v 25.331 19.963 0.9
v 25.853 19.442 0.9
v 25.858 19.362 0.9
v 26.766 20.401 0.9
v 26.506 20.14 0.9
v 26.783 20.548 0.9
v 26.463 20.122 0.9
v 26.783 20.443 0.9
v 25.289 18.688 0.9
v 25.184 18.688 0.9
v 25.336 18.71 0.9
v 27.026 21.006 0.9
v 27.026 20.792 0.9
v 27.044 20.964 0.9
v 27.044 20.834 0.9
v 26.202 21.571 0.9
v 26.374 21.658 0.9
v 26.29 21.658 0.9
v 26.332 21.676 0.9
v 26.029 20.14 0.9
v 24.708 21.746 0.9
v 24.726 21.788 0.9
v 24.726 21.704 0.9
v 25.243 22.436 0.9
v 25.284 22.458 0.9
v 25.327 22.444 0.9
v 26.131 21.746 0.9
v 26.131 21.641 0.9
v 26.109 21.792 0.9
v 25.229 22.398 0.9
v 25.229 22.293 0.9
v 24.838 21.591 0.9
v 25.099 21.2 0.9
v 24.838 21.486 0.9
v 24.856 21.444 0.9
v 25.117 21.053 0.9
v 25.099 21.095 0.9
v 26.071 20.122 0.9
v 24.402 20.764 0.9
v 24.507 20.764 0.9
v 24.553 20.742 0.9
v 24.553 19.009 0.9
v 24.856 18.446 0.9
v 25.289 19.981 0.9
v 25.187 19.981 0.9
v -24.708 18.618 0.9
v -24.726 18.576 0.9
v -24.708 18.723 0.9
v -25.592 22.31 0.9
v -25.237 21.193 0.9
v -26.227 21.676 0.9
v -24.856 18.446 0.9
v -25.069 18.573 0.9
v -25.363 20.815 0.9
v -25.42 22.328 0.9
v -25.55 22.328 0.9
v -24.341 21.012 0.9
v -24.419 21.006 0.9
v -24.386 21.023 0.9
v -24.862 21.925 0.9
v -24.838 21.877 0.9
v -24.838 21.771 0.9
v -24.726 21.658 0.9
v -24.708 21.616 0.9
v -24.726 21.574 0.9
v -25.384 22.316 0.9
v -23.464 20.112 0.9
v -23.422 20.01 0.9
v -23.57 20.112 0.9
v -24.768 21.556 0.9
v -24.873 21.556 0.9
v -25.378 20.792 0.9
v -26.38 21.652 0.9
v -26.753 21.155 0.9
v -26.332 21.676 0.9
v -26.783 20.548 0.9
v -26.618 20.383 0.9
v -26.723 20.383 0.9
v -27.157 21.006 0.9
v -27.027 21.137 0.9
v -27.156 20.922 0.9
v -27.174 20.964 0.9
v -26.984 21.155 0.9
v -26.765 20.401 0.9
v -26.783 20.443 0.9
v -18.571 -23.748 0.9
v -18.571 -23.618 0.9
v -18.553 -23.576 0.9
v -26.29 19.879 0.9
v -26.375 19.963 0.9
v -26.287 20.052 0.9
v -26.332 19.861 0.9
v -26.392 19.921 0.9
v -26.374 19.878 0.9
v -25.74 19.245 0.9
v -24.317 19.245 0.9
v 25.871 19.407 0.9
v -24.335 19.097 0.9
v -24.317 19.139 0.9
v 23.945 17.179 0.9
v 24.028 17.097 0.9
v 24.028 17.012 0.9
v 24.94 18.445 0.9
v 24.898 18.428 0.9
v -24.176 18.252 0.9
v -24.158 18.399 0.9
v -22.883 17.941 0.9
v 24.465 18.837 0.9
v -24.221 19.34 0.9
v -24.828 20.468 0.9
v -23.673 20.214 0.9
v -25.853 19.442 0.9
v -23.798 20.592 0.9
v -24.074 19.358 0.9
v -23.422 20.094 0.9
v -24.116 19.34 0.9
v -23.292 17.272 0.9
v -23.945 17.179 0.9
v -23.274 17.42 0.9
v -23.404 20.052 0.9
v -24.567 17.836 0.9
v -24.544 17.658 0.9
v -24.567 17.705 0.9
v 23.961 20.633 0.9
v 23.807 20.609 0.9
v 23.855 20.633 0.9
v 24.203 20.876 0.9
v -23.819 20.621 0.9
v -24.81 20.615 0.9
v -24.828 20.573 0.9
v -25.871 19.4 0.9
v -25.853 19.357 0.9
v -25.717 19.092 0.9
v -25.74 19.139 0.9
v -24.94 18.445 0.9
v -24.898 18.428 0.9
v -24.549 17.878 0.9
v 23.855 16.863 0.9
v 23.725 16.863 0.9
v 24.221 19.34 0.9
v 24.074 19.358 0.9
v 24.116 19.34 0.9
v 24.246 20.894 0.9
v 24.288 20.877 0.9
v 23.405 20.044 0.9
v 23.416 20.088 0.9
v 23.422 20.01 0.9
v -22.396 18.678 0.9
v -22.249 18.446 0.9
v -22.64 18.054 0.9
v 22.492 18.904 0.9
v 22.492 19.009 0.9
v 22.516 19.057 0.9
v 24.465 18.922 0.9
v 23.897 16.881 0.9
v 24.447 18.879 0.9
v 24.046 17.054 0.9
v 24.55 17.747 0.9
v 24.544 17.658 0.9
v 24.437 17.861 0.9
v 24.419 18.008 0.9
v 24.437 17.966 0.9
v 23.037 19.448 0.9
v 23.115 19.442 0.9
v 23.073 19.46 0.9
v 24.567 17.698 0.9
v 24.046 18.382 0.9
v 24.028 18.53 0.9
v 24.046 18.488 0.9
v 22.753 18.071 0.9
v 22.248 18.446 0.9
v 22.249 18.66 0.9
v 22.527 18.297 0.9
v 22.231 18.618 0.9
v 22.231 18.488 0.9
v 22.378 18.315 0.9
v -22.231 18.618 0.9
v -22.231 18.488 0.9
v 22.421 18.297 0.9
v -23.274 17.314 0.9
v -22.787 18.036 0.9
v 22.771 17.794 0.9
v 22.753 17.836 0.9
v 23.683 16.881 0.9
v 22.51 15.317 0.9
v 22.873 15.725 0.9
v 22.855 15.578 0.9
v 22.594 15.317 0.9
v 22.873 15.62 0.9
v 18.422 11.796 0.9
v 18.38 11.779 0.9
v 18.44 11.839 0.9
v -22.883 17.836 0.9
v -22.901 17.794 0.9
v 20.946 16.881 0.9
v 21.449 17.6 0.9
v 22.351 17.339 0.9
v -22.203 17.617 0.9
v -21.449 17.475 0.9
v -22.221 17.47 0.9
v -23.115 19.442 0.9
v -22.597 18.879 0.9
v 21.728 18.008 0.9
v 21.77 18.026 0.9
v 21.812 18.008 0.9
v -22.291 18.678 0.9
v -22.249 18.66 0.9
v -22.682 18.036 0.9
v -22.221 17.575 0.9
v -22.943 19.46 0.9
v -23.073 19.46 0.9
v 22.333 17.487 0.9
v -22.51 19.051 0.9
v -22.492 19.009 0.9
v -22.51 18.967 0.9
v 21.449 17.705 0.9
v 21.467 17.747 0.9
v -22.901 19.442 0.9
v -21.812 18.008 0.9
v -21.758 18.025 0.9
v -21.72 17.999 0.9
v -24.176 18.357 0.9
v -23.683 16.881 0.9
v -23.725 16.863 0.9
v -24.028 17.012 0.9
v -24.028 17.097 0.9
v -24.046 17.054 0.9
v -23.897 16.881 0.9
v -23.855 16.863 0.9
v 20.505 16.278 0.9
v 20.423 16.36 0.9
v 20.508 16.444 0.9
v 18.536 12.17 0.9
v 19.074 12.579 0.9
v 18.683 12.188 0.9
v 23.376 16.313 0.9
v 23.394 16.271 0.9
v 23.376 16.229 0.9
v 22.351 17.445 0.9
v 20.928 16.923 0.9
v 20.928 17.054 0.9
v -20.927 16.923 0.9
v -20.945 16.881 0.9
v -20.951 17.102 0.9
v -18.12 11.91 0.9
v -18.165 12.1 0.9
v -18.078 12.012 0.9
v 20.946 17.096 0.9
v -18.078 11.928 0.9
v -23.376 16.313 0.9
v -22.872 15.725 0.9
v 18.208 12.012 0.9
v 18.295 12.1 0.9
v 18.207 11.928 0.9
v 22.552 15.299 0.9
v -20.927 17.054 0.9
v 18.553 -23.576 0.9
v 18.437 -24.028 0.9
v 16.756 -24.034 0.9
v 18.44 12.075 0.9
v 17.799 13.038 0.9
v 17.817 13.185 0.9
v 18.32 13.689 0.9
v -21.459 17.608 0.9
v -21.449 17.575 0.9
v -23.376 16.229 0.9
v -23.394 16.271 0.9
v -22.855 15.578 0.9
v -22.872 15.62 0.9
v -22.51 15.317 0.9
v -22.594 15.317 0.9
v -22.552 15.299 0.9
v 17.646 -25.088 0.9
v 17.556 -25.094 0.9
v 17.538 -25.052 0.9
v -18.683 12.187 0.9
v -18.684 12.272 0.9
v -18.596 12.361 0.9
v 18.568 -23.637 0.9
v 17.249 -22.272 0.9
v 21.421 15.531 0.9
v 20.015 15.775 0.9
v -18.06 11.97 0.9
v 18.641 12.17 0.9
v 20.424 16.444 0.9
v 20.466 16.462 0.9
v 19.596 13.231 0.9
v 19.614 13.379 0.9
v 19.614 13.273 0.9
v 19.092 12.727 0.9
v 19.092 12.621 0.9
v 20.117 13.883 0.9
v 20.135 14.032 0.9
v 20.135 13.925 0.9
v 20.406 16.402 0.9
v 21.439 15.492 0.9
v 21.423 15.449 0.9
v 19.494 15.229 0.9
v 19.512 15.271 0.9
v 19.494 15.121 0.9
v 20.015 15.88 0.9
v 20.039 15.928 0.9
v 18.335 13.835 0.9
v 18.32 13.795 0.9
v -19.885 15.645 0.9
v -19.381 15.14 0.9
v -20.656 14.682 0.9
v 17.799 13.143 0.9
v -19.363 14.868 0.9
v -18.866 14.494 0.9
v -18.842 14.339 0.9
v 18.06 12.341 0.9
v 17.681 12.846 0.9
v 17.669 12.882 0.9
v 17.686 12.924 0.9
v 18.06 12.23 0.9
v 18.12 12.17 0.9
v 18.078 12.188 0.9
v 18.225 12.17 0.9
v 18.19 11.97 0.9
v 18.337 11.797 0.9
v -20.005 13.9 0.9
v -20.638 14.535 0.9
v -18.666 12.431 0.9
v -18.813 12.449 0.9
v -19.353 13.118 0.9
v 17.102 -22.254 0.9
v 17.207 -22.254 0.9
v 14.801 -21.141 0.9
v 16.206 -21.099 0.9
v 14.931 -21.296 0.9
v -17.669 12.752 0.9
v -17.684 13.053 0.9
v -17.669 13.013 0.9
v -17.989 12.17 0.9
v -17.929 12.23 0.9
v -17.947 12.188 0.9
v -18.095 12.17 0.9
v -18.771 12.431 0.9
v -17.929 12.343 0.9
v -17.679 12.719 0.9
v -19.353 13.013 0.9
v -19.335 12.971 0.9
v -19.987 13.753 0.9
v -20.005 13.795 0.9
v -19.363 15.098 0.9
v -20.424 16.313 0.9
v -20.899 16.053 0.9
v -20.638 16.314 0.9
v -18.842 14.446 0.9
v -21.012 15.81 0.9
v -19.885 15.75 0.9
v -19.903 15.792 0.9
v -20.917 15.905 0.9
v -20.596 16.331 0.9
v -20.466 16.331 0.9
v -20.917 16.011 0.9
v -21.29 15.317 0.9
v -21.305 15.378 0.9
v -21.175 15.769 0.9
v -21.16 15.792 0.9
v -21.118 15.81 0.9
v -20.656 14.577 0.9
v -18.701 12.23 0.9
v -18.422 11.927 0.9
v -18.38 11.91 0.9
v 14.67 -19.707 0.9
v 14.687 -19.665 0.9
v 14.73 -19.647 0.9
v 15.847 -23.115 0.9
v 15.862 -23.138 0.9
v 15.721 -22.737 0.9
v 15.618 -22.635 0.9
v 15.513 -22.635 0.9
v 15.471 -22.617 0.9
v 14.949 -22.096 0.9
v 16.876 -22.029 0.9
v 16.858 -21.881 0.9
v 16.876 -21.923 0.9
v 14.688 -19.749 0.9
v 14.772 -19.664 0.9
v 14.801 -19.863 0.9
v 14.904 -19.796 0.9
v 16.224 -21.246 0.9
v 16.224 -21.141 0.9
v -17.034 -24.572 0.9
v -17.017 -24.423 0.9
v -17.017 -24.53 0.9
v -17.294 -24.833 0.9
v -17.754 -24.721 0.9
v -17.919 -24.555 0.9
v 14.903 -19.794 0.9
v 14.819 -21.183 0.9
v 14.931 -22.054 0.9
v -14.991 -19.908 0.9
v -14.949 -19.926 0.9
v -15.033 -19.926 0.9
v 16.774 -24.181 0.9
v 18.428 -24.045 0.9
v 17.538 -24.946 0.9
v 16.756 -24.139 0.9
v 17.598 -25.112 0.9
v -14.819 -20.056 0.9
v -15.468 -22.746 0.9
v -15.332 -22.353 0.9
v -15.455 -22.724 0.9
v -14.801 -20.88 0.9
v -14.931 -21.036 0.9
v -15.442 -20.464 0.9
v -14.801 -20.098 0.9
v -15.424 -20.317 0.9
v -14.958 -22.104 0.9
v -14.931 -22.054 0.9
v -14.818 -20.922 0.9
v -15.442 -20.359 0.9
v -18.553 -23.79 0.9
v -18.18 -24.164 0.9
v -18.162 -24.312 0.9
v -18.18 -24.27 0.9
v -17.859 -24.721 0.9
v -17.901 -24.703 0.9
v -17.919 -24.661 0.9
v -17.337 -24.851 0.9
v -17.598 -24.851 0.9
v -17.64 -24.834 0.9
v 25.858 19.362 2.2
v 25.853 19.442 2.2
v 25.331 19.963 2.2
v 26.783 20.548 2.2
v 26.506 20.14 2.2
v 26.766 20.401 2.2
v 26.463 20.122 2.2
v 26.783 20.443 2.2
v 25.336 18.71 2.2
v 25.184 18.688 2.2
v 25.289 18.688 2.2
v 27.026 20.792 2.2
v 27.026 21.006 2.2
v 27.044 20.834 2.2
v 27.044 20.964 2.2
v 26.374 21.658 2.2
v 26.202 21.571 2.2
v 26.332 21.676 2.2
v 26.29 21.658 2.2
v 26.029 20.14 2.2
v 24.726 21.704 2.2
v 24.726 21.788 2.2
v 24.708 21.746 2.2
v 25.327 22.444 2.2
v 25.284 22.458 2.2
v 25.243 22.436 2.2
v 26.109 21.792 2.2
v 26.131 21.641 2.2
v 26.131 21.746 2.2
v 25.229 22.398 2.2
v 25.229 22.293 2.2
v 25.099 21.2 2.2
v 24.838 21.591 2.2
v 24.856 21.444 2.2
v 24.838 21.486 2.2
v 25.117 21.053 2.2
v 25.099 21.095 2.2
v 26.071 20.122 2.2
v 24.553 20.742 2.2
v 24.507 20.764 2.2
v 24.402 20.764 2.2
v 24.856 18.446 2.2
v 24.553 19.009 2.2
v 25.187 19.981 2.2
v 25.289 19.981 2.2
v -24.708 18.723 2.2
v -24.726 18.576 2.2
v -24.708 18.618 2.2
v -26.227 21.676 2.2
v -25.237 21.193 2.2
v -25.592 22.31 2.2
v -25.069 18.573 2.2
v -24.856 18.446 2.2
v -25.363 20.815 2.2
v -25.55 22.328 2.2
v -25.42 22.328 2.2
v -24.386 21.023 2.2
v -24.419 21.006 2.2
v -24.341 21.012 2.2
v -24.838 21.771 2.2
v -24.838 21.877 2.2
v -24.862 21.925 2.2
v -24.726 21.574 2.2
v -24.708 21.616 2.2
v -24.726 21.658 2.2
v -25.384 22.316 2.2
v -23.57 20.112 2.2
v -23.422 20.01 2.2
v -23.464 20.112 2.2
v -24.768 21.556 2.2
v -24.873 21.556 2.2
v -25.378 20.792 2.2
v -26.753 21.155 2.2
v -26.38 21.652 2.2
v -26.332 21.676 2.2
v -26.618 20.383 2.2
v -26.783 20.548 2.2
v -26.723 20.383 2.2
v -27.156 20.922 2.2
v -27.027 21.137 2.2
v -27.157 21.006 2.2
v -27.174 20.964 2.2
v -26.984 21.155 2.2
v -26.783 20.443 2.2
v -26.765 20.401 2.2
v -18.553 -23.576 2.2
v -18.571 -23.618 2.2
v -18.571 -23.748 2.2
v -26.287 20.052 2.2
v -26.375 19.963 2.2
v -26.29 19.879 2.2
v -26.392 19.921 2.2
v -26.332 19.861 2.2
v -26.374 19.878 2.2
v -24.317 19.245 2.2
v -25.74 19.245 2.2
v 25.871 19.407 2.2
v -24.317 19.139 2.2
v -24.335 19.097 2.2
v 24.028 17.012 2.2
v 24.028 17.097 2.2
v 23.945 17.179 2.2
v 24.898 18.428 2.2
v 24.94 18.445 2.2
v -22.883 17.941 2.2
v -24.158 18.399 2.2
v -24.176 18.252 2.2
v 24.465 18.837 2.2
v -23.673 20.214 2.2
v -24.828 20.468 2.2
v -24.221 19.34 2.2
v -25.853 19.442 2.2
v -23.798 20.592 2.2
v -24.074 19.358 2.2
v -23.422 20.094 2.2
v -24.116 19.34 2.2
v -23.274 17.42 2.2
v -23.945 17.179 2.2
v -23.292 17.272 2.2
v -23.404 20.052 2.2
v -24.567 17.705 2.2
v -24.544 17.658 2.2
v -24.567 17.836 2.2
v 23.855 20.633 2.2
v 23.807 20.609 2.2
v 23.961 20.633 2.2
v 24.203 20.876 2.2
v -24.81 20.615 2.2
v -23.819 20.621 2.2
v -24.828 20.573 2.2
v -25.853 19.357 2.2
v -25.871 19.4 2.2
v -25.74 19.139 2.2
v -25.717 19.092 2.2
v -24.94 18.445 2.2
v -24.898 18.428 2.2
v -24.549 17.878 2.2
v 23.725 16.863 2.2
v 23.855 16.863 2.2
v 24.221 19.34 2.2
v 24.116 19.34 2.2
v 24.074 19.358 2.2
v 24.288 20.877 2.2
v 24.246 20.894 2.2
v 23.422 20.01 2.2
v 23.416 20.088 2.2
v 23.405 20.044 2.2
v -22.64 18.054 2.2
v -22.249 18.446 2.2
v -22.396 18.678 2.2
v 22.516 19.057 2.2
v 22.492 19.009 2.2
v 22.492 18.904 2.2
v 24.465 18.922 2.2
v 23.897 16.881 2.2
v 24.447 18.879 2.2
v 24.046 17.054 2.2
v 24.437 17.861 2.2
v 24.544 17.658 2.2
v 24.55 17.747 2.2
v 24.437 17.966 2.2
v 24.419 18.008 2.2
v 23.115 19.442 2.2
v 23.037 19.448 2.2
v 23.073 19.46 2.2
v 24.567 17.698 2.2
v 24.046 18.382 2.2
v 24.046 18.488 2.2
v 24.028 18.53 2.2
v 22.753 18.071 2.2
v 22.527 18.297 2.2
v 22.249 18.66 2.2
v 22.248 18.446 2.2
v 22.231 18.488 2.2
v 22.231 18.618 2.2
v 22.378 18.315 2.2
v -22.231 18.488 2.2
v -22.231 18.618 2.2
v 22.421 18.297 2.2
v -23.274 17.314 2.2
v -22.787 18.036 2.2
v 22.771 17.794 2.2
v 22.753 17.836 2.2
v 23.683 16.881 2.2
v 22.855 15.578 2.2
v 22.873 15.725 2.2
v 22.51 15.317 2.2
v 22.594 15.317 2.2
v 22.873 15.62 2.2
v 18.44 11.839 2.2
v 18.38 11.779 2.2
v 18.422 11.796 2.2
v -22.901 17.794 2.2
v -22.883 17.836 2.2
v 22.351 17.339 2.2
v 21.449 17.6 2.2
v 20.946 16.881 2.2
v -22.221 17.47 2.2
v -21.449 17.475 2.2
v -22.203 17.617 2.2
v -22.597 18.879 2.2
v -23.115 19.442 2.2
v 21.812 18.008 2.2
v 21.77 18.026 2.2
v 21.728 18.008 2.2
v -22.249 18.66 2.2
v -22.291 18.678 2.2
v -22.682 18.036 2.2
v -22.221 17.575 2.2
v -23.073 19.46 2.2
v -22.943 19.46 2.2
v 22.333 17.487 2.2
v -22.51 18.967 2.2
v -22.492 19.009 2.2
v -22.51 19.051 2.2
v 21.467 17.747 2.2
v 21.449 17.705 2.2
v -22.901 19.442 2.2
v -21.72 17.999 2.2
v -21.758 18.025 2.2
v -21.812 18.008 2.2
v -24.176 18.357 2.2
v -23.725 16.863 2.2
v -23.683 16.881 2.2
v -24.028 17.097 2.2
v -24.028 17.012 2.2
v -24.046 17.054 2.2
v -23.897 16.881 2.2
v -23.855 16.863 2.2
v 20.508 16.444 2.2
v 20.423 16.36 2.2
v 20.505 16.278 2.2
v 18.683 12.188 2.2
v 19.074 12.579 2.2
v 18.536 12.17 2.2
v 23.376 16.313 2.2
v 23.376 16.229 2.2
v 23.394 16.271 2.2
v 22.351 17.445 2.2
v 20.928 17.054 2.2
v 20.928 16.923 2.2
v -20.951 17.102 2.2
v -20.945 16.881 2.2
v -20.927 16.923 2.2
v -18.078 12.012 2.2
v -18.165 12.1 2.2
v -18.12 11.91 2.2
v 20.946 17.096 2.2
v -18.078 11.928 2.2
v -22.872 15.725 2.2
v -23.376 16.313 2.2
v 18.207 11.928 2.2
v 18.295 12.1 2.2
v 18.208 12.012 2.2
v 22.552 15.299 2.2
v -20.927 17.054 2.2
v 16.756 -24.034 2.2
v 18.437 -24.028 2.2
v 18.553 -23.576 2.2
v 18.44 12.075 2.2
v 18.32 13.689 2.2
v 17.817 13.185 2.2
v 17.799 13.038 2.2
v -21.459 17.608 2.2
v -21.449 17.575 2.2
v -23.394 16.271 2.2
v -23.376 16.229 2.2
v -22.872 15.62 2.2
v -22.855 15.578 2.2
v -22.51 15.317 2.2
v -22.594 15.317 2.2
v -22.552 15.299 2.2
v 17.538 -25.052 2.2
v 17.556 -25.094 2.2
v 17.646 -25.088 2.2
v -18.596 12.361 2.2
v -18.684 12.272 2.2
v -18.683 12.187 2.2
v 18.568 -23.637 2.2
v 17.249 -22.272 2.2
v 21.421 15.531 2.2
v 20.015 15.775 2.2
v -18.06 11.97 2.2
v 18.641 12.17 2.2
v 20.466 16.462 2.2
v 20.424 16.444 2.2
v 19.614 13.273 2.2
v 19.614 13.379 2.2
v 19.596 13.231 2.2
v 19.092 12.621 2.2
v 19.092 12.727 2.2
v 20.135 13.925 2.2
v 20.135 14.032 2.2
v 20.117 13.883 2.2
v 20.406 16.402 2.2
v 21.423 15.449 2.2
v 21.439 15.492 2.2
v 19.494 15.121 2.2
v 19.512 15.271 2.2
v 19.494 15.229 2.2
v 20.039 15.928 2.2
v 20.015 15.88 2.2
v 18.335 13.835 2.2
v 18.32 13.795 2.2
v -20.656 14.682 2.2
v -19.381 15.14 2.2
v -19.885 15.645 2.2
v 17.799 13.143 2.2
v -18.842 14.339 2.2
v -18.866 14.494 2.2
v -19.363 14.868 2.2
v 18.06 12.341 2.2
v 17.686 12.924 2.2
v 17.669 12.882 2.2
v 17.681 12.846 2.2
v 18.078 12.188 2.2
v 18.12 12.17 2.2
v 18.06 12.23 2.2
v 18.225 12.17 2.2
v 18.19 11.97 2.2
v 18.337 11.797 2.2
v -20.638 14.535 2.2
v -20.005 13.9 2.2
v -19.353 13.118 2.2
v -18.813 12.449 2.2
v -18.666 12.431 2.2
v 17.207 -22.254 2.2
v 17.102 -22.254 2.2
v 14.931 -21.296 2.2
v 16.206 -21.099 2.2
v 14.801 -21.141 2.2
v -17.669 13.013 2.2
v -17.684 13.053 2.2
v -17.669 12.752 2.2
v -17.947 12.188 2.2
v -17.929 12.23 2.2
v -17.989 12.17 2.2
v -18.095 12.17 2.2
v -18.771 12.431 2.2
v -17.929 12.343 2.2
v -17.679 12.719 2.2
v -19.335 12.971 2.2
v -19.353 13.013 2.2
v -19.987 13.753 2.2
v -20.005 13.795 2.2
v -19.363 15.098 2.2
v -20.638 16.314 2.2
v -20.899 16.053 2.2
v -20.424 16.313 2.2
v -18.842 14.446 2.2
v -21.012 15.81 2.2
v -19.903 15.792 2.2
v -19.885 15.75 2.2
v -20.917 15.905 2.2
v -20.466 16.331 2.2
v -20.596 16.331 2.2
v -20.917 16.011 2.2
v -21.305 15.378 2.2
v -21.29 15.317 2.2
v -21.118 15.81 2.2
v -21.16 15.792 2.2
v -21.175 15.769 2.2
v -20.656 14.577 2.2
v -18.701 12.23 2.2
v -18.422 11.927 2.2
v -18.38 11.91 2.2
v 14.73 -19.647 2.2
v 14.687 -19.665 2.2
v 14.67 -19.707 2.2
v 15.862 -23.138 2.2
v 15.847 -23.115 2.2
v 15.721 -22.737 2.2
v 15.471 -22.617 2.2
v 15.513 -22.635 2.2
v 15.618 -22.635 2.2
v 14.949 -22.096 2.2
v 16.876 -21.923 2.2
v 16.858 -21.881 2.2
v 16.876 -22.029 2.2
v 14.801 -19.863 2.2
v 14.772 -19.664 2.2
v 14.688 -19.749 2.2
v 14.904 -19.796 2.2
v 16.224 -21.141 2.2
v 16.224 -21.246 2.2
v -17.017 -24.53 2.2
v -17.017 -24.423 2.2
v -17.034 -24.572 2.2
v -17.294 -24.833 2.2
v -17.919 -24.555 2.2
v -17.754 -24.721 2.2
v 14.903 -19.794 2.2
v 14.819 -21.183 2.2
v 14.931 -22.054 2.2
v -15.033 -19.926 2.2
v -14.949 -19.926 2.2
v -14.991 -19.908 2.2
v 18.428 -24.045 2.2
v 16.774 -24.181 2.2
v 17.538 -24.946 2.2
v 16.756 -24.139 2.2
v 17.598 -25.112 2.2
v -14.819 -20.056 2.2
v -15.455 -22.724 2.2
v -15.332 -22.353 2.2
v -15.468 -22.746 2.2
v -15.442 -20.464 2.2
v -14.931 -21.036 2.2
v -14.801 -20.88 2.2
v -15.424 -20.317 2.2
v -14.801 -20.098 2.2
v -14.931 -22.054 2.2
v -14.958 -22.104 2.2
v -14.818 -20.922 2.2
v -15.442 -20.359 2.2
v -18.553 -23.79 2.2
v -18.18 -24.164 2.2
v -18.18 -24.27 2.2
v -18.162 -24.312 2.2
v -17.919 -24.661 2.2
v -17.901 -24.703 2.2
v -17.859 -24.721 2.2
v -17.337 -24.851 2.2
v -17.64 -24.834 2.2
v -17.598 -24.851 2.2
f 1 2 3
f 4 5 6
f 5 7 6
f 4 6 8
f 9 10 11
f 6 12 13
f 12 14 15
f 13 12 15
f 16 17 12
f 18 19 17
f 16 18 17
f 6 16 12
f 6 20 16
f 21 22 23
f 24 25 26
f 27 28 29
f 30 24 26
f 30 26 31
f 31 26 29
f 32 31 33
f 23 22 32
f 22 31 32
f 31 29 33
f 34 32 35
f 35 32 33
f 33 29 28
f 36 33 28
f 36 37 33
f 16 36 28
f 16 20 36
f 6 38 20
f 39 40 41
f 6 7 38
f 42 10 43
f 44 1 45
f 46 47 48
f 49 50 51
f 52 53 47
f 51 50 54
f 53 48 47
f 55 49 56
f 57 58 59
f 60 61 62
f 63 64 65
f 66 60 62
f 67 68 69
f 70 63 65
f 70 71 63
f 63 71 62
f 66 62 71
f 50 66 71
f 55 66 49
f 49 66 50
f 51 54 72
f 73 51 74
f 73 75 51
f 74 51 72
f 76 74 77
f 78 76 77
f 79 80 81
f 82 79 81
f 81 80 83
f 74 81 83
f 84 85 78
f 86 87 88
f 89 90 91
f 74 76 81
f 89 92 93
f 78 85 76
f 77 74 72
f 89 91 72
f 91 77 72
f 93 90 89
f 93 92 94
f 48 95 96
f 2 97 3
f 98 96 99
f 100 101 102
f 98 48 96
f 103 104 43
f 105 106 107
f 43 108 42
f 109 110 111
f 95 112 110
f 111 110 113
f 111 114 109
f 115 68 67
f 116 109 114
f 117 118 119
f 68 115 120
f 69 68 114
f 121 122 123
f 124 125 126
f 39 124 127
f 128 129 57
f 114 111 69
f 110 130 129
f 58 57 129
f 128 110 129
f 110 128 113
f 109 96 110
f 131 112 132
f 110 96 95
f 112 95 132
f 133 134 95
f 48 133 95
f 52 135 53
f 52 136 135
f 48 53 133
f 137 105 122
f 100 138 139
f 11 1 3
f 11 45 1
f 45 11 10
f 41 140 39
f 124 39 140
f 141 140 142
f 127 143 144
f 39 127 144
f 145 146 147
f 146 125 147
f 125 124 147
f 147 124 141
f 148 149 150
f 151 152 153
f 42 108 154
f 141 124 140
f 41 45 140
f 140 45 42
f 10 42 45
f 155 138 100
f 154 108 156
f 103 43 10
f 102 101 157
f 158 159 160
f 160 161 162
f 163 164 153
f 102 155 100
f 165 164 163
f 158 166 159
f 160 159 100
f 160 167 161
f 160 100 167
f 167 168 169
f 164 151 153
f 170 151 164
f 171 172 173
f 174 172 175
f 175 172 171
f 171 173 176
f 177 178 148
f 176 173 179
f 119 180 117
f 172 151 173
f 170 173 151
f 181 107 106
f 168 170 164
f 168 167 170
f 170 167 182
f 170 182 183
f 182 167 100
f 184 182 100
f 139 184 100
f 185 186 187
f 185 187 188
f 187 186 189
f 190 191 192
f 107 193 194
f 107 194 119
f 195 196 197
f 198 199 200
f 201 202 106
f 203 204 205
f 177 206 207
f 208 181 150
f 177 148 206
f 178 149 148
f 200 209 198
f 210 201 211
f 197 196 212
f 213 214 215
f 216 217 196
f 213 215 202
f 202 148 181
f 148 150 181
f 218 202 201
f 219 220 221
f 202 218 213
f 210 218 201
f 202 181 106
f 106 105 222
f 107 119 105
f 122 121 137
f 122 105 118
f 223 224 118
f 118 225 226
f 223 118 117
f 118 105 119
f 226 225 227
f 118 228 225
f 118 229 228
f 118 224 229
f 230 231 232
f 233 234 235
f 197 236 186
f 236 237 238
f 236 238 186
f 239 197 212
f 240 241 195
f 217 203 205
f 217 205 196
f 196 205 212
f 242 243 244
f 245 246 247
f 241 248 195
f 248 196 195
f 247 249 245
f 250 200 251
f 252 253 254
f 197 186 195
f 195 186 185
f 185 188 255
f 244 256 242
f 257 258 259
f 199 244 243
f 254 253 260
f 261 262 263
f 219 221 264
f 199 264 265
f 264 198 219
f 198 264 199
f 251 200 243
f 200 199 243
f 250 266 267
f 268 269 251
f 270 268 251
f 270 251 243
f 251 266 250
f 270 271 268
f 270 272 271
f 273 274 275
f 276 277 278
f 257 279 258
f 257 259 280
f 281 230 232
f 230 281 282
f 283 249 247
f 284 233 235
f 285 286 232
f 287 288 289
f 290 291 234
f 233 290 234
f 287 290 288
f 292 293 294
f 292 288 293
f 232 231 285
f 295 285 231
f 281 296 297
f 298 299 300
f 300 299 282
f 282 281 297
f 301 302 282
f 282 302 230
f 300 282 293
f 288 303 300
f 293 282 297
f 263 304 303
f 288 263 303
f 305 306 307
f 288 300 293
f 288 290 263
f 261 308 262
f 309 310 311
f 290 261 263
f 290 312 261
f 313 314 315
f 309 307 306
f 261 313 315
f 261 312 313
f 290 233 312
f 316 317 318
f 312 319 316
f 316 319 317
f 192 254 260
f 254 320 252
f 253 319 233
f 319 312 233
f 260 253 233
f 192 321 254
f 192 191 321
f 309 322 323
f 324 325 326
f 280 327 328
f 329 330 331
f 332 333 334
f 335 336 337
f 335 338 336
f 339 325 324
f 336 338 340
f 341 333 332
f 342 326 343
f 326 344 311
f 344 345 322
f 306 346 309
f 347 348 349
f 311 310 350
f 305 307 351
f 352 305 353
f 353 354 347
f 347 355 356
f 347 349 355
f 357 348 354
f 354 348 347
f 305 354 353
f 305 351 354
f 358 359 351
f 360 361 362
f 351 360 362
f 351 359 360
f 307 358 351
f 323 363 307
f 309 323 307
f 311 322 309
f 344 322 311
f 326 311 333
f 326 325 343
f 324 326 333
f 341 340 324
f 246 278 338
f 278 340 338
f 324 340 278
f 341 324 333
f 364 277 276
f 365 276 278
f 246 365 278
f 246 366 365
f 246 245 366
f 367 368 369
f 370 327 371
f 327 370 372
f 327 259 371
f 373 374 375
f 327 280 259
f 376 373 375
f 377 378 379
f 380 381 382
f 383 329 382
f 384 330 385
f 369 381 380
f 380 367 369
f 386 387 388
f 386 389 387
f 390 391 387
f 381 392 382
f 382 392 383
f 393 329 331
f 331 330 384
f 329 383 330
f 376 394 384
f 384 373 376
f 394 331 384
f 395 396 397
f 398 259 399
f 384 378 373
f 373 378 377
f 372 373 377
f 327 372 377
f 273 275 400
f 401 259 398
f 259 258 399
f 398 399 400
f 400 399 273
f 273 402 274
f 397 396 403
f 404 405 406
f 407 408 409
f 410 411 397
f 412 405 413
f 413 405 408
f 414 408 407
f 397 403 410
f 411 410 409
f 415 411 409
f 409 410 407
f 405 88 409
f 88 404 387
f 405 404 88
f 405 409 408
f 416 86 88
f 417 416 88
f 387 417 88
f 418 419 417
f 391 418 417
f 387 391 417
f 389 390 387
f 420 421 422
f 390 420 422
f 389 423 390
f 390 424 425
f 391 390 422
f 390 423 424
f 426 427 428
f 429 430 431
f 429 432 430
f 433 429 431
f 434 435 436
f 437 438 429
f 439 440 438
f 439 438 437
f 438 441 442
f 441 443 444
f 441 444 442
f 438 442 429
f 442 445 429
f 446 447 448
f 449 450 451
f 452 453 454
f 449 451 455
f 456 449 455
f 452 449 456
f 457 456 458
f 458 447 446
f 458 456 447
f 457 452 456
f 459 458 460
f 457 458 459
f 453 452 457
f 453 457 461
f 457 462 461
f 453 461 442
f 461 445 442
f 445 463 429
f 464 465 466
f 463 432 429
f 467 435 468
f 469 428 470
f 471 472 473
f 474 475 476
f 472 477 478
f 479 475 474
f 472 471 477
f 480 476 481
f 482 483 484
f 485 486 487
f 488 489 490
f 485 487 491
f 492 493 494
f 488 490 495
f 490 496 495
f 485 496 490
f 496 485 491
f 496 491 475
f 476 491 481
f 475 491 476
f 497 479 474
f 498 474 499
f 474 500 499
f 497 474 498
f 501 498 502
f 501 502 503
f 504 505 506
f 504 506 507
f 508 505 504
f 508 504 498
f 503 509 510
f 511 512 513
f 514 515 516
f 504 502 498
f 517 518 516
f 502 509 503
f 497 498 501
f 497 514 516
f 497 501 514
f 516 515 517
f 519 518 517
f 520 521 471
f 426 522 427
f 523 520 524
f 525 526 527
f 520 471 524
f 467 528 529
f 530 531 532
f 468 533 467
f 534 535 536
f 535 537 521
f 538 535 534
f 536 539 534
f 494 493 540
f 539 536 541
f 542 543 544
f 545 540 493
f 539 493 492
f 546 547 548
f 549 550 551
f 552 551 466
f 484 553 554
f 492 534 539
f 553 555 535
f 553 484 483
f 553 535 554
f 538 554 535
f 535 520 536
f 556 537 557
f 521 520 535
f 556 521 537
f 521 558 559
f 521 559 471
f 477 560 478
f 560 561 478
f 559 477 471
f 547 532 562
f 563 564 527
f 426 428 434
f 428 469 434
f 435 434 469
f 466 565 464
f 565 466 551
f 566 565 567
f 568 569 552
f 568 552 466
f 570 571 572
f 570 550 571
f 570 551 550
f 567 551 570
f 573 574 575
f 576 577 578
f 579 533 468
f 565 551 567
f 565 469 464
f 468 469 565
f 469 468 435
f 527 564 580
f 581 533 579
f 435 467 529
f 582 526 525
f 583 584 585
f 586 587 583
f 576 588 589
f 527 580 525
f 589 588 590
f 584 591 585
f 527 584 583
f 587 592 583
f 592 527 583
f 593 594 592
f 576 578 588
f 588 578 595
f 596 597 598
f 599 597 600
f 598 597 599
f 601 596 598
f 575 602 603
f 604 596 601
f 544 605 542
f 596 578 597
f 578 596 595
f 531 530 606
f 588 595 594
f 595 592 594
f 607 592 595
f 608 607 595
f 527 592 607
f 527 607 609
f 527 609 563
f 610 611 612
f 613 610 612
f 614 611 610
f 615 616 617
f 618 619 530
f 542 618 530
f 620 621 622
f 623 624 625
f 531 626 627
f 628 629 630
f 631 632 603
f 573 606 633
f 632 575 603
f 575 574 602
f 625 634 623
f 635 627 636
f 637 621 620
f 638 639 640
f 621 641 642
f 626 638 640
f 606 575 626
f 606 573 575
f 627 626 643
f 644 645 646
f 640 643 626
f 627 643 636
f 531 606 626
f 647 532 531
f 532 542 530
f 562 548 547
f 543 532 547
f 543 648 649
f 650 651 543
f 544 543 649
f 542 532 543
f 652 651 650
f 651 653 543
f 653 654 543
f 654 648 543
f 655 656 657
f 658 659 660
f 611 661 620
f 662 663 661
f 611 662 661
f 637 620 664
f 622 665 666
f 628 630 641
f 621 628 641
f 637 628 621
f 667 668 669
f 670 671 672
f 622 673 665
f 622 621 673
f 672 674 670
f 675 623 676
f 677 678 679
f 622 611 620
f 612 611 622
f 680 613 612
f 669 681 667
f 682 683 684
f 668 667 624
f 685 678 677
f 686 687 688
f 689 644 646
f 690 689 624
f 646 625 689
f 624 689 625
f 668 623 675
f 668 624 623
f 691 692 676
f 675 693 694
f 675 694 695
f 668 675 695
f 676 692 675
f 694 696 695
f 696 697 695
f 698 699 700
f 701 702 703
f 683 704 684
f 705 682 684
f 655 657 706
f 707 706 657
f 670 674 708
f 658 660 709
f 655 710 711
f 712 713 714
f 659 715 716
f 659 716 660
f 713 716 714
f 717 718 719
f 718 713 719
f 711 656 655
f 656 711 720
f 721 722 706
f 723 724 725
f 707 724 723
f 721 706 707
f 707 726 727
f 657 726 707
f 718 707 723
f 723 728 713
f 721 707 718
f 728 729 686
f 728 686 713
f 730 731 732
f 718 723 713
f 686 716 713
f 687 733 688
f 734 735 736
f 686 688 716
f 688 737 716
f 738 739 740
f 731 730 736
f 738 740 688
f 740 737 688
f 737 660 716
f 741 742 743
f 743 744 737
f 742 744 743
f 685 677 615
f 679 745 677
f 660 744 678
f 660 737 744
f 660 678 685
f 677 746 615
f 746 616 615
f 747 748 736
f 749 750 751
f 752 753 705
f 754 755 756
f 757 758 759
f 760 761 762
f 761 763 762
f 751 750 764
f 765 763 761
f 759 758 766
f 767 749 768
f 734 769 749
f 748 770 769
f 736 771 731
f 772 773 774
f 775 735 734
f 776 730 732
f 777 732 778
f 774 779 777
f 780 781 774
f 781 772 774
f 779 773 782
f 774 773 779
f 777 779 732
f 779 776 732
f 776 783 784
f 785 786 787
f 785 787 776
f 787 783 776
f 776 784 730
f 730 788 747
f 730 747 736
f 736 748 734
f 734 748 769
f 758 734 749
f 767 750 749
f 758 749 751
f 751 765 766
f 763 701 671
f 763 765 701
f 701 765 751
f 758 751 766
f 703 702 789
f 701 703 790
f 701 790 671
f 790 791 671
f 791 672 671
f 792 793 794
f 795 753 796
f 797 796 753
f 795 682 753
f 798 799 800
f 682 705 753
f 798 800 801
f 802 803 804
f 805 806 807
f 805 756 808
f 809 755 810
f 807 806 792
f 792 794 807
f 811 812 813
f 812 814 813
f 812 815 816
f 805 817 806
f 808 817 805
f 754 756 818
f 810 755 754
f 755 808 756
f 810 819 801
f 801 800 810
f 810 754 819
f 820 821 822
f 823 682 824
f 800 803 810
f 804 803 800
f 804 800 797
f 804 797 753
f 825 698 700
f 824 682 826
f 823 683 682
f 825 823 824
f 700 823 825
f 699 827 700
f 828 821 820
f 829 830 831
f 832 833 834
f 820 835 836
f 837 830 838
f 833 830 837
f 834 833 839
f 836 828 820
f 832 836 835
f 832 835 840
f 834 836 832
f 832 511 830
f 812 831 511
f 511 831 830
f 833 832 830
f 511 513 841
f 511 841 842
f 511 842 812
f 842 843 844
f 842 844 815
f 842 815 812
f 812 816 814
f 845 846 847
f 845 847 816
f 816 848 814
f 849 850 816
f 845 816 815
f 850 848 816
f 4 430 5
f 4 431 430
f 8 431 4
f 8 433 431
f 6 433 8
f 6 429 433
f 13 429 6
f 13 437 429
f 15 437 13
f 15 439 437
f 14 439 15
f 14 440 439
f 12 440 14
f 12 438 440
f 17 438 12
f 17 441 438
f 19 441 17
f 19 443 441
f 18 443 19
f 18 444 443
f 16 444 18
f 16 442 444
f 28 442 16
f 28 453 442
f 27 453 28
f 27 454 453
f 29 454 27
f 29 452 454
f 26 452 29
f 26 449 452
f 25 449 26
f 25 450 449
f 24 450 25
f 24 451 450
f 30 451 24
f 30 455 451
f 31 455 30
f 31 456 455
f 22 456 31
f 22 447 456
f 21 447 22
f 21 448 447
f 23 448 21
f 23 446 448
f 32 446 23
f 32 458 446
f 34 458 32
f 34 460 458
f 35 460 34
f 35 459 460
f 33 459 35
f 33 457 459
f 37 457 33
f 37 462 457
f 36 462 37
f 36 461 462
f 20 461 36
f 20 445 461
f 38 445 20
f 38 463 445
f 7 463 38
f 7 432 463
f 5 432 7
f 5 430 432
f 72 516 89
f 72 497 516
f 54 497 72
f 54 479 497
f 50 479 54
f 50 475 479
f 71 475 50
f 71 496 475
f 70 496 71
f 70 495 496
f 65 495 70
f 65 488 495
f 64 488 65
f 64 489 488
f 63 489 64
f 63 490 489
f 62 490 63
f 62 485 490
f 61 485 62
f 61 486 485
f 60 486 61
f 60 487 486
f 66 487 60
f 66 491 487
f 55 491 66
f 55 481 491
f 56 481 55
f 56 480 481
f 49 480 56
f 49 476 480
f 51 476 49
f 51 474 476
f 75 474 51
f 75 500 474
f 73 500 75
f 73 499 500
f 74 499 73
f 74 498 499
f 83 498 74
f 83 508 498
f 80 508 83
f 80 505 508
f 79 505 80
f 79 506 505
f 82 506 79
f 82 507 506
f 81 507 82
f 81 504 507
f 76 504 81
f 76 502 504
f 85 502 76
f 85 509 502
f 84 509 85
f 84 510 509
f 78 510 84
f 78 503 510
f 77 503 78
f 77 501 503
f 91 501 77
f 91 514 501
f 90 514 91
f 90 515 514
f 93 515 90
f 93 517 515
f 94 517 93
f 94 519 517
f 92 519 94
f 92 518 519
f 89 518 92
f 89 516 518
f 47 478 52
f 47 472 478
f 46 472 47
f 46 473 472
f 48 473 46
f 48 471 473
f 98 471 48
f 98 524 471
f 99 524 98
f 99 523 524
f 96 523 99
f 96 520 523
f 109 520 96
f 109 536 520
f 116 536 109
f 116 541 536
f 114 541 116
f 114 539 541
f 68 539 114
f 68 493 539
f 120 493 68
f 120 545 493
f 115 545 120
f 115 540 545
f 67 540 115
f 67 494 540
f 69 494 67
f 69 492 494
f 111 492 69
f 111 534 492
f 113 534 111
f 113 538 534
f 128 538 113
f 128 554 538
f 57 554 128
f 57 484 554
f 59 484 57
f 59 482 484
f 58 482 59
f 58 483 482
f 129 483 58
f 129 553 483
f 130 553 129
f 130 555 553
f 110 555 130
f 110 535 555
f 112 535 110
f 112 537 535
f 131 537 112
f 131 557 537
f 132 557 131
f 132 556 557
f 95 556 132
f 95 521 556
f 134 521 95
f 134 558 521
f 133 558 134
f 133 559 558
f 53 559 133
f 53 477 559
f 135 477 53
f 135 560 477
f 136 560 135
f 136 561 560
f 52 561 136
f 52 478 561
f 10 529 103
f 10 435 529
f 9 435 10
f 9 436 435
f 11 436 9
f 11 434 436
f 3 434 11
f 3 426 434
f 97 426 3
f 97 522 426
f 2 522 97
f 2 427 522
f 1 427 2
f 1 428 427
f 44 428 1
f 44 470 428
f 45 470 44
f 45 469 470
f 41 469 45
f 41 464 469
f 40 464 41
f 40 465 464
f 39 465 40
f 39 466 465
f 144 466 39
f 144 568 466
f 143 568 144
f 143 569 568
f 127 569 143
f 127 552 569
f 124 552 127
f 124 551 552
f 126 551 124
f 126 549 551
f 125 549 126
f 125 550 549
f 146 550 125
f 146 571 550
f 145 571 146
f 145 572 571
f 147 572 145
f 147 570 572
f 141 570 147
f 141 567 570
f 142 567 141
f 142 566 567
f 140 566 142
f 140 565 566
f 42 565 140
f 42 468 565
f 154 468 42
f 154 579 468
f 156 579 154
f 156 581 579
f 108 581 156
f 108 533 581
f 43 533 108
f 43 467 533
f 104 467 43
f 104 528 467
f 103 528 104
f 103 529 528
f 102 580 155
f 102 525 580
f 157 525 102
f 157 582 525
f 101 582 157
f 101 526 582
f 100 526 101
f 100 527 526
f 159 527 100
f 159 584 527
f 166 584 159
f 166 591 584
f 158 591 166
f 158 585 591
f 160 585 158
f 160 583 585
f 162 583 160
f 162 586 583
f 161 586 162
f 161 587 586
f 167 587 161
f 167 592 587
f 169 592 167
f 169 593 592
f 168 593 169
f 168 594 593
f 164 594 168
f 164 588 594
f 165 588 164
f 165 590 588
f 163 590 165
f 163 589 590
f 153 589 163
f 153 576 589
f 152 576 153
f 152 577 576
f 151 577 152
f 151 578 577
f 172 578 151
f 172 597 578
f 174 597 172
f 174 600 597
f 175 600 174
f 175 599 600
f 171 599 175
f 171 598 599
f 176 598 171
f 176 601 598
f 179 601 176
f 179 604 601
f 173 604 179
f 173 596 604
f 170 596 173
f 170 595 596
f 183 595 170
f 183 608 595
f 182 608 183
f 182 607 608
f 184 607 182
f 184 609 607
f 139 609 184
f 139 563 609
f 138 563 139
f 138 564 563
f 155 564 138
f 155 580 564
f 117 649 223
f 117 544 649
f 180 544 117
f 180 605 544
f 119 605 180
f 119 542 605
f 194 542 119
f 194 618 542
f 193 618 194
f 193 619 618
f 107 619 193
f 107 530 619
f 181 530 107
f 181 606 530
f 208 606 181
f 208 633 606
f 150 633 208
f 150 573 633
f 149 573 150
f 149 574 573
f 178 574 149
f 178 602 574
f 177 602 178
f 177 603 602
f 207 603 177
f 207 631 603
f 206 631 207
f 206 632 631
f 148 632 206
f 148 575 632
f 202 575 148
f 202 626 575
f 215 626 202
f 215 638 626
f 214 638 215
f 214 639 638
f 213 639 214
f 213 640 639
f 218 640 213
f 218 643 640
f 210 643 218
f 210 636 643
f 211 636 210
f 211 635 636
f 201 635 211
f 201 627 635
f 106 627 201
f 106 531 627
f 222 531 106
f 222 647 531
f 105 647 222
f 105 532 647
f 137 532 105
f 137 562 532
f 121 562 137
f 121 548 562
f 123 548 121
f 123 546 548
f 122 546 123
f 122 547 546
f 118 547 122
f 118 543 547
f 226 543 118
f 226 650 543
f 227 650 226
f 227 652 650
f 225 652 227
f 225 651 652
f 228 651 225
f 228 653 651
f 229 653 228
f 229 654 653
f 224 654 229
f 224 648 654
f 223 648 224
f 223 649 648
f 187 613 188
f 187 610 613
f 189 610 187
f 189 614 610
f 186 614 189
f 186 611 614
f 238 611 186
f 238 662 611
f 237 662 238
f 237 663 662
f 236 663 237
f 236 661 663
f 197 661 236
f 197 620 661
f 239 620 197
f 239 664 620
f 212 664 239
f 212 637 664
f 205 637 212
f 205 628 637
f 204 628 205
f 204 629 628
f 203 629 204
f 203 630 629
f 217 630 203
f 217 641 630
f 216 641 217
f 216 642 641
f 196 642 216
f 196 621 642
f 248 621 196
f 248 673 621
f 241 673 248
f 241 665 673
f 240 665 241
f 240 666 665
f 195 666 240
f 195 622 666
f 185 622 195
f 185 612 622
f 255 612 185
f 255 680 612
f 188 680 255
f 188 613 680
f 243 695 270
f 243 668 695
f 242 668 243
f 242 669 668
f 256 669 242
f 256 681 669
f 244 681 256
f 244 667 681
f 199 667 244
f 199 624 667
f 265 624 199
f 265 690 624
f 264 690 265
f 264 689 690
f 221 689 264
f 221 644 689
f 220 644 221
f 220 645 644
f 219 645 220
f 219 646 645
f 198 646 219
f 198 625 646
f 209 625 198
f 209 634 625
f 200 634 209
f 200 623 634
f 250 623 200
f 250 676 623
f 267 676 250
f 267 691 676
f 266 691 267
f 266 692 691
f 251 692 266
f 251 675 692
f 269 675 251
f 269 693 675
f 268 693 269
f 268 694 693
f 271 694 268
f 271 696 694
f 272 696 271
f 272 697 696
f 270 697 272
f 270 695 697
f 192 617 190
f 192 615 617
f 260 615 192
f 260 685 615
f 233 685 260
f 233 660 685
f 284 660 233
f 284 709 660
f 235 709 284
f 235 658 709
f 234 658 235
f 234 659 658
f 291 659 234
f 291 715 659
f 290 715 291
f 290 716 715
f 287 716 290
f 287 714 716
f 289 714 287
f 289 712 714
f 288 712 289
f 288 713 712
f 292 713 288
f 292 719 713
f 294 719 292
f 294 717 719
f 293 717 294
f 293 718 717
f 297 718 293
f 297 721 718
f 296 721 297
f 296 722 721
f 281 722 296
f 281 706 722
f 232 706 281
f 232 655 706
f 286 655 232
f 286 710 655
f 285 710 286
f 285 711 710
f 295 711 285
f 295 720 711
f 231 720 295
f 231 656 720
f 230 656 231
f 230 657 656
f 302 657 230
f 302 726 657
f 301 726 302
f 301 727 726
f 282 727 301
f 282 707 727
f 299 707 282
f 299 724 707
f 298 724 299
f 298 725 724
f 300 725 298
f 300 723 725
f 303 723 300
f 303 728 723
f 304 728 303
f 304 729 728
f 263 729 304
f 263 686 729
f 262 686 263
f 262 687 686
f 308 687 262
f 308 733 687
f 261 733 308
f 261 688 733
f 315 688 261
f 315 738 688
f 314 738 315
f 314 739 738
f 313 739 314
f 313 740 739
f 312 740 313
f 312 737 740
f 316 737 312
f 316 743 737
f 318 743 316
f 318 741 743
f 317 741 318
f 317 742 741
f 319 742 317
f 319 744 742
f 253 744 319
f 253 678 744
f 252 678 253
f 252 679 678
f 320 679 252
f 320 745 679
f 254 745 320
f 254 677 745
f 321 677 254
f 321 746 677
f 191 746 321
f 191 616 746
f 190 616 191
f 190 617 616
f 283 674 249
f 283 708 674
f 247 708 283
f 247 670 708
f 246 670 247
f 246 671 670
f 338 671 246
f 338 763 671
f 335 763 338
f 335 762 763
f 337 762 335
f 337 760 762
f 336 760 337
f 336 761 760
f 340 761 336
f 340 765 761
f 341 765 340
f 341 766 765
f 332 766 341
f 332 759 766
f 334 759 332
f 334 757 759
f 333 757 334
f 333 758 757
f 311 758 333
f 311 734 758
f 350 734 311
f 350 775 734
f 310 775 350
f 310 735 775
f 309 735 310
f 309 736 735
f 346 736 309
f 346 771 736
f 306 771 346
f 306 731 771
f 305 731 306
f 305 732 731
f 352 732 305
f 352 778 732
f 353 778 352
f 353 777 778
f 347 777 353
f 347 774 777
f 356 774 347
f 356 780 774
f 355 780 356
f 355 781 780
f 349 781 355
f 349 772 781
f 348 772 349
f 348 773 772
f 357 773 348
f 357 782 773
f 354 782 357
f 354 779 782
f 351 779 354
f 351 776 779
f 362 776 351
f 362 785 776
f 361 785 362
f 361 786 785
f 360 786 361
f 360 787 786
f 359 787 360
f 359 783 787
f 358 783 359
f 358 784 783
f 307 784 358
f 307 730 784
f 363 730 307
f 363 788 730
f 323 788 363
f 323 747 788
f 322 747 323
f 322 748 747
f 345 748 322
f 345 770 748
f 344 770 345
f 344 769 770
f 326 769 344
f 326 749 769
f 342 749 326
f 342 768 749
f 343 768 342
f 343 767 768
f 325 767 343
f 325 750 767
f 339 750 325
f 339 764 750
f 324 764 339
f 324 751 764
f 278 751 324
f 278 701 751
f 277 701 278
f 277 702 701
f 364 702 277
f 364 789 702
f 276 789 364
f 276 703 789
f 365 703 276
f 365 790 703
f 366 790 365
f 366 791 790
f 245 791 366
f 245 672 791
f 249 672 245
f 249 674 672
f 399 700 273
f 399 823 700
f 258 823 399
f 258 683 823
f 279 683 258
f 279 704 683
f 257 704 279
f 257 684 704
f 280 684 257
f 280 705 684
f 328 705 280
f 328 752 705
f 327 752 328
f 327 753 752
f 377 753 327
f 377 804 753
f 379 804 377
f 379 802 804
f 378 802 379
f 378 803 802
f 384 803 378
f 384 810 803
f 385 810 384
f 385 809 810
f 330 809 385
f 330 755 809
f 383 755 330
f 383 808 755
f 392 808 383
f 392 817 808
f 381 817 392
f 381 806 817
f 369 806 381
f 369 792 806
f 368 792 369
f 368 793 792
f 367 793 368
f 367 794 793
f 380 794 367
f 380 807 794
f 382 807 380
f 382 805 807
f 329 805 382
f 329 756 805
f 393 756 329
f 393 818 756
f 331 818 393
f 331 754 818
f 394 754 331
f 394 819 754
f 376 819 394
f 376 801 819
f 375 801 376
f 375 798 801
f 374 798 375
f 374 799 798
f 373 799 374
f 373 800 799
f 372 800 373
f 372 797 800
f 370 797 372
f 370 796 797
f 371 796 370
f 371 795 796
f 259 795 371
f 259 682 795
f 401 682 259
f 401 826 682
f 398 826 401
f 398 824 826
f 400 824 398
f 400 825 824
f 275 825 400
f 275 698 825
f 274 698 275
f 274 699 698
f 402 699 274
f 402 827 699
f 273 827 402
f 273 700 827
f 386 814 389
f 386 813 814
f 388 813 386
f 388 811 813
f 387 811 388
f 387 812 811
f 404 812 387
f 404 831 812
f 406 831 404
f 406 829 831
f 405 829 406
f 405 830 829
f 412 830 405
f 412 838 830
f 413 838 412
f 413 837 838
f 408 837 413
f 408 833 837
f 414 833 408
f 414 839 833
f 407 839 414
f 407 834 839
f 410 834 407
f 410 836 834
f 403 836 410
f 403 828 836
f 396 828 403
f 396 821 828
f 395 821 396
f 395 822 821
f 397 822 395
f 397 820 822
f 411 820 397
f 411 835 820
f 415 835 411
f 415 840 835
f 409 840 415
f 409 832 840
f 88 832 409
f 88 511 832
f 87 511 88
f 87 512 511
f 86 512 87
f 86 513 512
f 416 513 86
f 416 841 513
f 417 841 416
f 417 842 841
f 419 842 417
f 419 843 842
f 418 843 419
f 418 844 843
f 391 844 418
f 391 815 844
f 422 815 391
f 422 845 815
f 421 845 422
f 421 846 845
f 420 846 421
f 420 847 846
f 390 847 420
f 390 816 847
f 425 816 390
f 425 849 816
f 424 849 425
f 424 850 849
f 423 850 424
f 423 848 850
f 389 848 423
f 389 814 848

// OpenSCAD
$fn = 24;
translate([0, -2.500, 0.900])
  linear_extrude(height=1.300) {
offset(r=0.06, $fn=8) {
    polygon(points=[[-14.991,-17.468],[-15.382,-17.859],[-15.382,-17.989],[-18.511,-21.118],[-18.511,-21.248],[-18.120,-21.639],[-18.120,-21.770],[-17.859,-22.030],[-17.859,-22.161],[-17.729,-22.161],[-17.598,-22.291],[-17.729,-22.421],[-17.598,-22.291],[-17.337,-22.291],[-17.077,-22.030],[-17.077,-21.900],[-15.512,-20.205],[-15.382,-19.814],[-14.991,-19.554],[-14.991,-18.511],[-14.861,-18.380],[-14.861,-17.598]], paths=[[0,1,2,3,4,5,6,7,8,9,10,11,12,13,14,15,16,17,18,19,20,21]]);
    polygon(points=[[14.730,-17.207],[14.861,-17.337],[14.861,-18.641],[14.991,-18.771],[14.991,-19.554],[15.513,-20.075],[15.643,-20.075],[15.773,-20.205],[15.904,-20.596],[16.816,-21.509],[16.816,-21.639],[17.598,-22.421],[17.598,-22.552],[18.380,-21.509],[18.511,-21.118],[17.207,-19.814],[17.077,-19.814],[16.816,-19.554],[16.816,-19.423],[16.164,-18.771],[16.164,-18.641]], paths=[[0,1,2,3,4,5,6,7,8,9,10,11,12,13,14,15,16,17,18,19,20]]);
    polygon(points=[[-20.596,18.771],[-20.857,18.511],[-20.857,18.380],[-20.987,18.250],[-21.118,18.250],[-21.248,17.859],[-20.596,17.207],[-20.596,17.077],[-19.945,16.425],[-19.945,16.295],[-19.293,15.643],[-19.293,15.513],[-18.771,14.991],[-18.641,14.991],[-18.511,14.861],[-18.641,14.730],[-18.380,14.470],[-18.120,14.470],[-18.250,14.600],[-18.120,14.730],[-17.989,14.730],[-17.989,14.861],[-17.729,15.252],[-17.729,15.513],[-18.902,16.816],[-18.902,16.946],[-19.423,17.338],[-19.423,17.598],[-19.945,18.120],[-19.945,18.250],[-20.466,18.771]], paths=[[0,1,2,3,4,5,6,7,8,9,10,11,12,13,14,15,16,17,18,19,20,21,22,23,24,25,26,27,28,29,30]]);
    polygon(points=[[20.466,18.902],[20.596,18.771],[20.075,18.380],[20.075,18.250],[19.554,17.729],[19.554,17.598],[18.380,16.295],[18.380,16.164],[17.859,15.643],[17.859,15.513],[17.729,15.382],[18.120,14.861],[18.120,14.730],[18.250,14.730],[18.380,14.600],[18.250,14.470],[18.380,14.339],[18.380,14.600],[18.511,14.730],[18.641,14.730],[19.032,15.121],[19.032,15.252],[19.554,15.773],[19.554,15.904],[20.075,16.425],[20.075,16.555],[21.379,17.989]], paths=[[0,1,2,3,4,5,6,7,8,9,10,11,12,13,14,15,16,17,18,19,20,21,22,23,24,25,26]]);
    polygon(points=[[21.770,20.466],[21.509,20.205],[21.509,20.075],[20.988,19.554],[20.988,19.423],[22.552,17.859],[22.813,18.120],[22.813,18.250],[23.334,18.771],[22.291,19.814],[22.291,19.945]], paths=[[0,1,2,3,4,5,6,7,8,9,10]]);
    polygon(points=[[-21.770,20.466],[-22.161,20.075],[-22.161,19.945],[-23.334,18.771],[-22.812,18.250],[-22.812,18.120],[-22.552,17.859],[-20.987,19.423],[-20.987,19.554],[-21.509,19.945],[-21.509,20.075]], paths=[[0,1,2,3,4,5,6,7,8,9,10]]);
    polygon(points=[[23.073,21.900],[22.552,21.509],[22.552,21.379],[22.291,21.118],[22.291,20.988],[22.421,20.857],[22.552,20.857],[22.813,20.596],[22.813,20.336],[23.725,19.423],[23.855,19.423],[23.986,19.554],[23.855,19.684],[24.507,20.205],[24.377,20.336],[24.377,20.466],[23.986,20.857],[23.986,20.988]], paths=[[0,1,2,3,4,5,6,7,8,9,10,11,12,13,14,15,16,17]]);
    polygon(points=[[-22.943,21.900],[-23.073,21.900],[-24.116,20.857],[-24.116,20.727],[-24.507,20.336],[-24.507,20.205],[-23.855,19.684],[-23.986,19.554],[-23.855,19.423],[-23.725,19.423],[-23.334,19.814],[-23.334,19.945],[-22.943,20.336],[-22.943,20.466],[-22.812,20.596],[-22.682,20.596],[-22.291,20.988],[-22.291,21.118],[-22.421,21.118],[-22.682,21.379],[-22.552,21.509]], paths=[[0,1,2,3,4,5,6,7,8,9,10,11,12,13,14,15,16,17,18,19,20]]);
    polygon(points=[[24.116,23.464],[24.246,23.334],[23.986,23.073],[23.855,23.073],[23.464,22.552],[24.116,21.900],[24.246,21.900],[24.638,21.509],[24.507,21.379],[24.898,20.988],[25.159,21.248],[25.289,21.248],[25.811,21.900],[25.289,22.421],[25.159,22.421],[24.507,23.204],[24.377,23.204],[24.246,23.334],[24.377,23.464],[24.246,23.334]], paths=[[0,1,2,3,4,5,6,7,8,9,10,11,12,13,14,15,16,17,18,19]]);
    polygon(points=[[-24.377,23.464],[-24.768,23.073],[-24.768,22.943],[-25.811,21.900],[-25.680,21.770],[-25.680,21.639],[-25.029,21.118],[-25.159,20.988],[-25.029,21.118],[-24.898,20.988],[-24.768,21.118],[-24.768,21.248],[-24.377,21.639],[-24.377,21.770],[-24.246,21.900],[-24.116,21.900],[-23.464,22.552],[-23.595,22.552],[-23.725,22.682],[-23.855,23.073]], paths=[[0,1,2,3,4,5,6,7,8,9,10,11,12,13,14,15,16,17,18,19]]);
    polygon(points=[[-25.420,24.768],[-25.550,24.768],[-26.202,24.116],[-26.332,24.116],[-26.723,23.595],[-26.984,23.595],[-27.114,23.464],[-26.723,23.073],[-26.723,22.943],[-26.593,22.943],[-26.202,22.552],[-26.332,22.421],[-25.420,23.334],[-25.289,23.725],[-24.898,24.116],[-24.768,24.116],[-24.898,24.246],[-24.898,24.377]], paths=[[0,1,2,3,4,5,6,7,8,9,10,11,12,13,14,15,16,17]]);
    polygon(points=[[25.289,24.898],[25.289,24.768],[24.768,24.246],[24.898,24.116],[24.898,23.986],[25.159,23.725],[25.159,23.595],[26.071,22.682],[26.463,22.682],[26.723,22.943],[26.723,23.073],[26.984,23.334],[26.984,23.464],[26.332,24.116],[26.202,23.986],[26.071,24.116],[26.071,24.246]], paths=[[0,1,2,3,4,5,6,7,8,9,10,11,12,13,14,15,16]]);
}
}
